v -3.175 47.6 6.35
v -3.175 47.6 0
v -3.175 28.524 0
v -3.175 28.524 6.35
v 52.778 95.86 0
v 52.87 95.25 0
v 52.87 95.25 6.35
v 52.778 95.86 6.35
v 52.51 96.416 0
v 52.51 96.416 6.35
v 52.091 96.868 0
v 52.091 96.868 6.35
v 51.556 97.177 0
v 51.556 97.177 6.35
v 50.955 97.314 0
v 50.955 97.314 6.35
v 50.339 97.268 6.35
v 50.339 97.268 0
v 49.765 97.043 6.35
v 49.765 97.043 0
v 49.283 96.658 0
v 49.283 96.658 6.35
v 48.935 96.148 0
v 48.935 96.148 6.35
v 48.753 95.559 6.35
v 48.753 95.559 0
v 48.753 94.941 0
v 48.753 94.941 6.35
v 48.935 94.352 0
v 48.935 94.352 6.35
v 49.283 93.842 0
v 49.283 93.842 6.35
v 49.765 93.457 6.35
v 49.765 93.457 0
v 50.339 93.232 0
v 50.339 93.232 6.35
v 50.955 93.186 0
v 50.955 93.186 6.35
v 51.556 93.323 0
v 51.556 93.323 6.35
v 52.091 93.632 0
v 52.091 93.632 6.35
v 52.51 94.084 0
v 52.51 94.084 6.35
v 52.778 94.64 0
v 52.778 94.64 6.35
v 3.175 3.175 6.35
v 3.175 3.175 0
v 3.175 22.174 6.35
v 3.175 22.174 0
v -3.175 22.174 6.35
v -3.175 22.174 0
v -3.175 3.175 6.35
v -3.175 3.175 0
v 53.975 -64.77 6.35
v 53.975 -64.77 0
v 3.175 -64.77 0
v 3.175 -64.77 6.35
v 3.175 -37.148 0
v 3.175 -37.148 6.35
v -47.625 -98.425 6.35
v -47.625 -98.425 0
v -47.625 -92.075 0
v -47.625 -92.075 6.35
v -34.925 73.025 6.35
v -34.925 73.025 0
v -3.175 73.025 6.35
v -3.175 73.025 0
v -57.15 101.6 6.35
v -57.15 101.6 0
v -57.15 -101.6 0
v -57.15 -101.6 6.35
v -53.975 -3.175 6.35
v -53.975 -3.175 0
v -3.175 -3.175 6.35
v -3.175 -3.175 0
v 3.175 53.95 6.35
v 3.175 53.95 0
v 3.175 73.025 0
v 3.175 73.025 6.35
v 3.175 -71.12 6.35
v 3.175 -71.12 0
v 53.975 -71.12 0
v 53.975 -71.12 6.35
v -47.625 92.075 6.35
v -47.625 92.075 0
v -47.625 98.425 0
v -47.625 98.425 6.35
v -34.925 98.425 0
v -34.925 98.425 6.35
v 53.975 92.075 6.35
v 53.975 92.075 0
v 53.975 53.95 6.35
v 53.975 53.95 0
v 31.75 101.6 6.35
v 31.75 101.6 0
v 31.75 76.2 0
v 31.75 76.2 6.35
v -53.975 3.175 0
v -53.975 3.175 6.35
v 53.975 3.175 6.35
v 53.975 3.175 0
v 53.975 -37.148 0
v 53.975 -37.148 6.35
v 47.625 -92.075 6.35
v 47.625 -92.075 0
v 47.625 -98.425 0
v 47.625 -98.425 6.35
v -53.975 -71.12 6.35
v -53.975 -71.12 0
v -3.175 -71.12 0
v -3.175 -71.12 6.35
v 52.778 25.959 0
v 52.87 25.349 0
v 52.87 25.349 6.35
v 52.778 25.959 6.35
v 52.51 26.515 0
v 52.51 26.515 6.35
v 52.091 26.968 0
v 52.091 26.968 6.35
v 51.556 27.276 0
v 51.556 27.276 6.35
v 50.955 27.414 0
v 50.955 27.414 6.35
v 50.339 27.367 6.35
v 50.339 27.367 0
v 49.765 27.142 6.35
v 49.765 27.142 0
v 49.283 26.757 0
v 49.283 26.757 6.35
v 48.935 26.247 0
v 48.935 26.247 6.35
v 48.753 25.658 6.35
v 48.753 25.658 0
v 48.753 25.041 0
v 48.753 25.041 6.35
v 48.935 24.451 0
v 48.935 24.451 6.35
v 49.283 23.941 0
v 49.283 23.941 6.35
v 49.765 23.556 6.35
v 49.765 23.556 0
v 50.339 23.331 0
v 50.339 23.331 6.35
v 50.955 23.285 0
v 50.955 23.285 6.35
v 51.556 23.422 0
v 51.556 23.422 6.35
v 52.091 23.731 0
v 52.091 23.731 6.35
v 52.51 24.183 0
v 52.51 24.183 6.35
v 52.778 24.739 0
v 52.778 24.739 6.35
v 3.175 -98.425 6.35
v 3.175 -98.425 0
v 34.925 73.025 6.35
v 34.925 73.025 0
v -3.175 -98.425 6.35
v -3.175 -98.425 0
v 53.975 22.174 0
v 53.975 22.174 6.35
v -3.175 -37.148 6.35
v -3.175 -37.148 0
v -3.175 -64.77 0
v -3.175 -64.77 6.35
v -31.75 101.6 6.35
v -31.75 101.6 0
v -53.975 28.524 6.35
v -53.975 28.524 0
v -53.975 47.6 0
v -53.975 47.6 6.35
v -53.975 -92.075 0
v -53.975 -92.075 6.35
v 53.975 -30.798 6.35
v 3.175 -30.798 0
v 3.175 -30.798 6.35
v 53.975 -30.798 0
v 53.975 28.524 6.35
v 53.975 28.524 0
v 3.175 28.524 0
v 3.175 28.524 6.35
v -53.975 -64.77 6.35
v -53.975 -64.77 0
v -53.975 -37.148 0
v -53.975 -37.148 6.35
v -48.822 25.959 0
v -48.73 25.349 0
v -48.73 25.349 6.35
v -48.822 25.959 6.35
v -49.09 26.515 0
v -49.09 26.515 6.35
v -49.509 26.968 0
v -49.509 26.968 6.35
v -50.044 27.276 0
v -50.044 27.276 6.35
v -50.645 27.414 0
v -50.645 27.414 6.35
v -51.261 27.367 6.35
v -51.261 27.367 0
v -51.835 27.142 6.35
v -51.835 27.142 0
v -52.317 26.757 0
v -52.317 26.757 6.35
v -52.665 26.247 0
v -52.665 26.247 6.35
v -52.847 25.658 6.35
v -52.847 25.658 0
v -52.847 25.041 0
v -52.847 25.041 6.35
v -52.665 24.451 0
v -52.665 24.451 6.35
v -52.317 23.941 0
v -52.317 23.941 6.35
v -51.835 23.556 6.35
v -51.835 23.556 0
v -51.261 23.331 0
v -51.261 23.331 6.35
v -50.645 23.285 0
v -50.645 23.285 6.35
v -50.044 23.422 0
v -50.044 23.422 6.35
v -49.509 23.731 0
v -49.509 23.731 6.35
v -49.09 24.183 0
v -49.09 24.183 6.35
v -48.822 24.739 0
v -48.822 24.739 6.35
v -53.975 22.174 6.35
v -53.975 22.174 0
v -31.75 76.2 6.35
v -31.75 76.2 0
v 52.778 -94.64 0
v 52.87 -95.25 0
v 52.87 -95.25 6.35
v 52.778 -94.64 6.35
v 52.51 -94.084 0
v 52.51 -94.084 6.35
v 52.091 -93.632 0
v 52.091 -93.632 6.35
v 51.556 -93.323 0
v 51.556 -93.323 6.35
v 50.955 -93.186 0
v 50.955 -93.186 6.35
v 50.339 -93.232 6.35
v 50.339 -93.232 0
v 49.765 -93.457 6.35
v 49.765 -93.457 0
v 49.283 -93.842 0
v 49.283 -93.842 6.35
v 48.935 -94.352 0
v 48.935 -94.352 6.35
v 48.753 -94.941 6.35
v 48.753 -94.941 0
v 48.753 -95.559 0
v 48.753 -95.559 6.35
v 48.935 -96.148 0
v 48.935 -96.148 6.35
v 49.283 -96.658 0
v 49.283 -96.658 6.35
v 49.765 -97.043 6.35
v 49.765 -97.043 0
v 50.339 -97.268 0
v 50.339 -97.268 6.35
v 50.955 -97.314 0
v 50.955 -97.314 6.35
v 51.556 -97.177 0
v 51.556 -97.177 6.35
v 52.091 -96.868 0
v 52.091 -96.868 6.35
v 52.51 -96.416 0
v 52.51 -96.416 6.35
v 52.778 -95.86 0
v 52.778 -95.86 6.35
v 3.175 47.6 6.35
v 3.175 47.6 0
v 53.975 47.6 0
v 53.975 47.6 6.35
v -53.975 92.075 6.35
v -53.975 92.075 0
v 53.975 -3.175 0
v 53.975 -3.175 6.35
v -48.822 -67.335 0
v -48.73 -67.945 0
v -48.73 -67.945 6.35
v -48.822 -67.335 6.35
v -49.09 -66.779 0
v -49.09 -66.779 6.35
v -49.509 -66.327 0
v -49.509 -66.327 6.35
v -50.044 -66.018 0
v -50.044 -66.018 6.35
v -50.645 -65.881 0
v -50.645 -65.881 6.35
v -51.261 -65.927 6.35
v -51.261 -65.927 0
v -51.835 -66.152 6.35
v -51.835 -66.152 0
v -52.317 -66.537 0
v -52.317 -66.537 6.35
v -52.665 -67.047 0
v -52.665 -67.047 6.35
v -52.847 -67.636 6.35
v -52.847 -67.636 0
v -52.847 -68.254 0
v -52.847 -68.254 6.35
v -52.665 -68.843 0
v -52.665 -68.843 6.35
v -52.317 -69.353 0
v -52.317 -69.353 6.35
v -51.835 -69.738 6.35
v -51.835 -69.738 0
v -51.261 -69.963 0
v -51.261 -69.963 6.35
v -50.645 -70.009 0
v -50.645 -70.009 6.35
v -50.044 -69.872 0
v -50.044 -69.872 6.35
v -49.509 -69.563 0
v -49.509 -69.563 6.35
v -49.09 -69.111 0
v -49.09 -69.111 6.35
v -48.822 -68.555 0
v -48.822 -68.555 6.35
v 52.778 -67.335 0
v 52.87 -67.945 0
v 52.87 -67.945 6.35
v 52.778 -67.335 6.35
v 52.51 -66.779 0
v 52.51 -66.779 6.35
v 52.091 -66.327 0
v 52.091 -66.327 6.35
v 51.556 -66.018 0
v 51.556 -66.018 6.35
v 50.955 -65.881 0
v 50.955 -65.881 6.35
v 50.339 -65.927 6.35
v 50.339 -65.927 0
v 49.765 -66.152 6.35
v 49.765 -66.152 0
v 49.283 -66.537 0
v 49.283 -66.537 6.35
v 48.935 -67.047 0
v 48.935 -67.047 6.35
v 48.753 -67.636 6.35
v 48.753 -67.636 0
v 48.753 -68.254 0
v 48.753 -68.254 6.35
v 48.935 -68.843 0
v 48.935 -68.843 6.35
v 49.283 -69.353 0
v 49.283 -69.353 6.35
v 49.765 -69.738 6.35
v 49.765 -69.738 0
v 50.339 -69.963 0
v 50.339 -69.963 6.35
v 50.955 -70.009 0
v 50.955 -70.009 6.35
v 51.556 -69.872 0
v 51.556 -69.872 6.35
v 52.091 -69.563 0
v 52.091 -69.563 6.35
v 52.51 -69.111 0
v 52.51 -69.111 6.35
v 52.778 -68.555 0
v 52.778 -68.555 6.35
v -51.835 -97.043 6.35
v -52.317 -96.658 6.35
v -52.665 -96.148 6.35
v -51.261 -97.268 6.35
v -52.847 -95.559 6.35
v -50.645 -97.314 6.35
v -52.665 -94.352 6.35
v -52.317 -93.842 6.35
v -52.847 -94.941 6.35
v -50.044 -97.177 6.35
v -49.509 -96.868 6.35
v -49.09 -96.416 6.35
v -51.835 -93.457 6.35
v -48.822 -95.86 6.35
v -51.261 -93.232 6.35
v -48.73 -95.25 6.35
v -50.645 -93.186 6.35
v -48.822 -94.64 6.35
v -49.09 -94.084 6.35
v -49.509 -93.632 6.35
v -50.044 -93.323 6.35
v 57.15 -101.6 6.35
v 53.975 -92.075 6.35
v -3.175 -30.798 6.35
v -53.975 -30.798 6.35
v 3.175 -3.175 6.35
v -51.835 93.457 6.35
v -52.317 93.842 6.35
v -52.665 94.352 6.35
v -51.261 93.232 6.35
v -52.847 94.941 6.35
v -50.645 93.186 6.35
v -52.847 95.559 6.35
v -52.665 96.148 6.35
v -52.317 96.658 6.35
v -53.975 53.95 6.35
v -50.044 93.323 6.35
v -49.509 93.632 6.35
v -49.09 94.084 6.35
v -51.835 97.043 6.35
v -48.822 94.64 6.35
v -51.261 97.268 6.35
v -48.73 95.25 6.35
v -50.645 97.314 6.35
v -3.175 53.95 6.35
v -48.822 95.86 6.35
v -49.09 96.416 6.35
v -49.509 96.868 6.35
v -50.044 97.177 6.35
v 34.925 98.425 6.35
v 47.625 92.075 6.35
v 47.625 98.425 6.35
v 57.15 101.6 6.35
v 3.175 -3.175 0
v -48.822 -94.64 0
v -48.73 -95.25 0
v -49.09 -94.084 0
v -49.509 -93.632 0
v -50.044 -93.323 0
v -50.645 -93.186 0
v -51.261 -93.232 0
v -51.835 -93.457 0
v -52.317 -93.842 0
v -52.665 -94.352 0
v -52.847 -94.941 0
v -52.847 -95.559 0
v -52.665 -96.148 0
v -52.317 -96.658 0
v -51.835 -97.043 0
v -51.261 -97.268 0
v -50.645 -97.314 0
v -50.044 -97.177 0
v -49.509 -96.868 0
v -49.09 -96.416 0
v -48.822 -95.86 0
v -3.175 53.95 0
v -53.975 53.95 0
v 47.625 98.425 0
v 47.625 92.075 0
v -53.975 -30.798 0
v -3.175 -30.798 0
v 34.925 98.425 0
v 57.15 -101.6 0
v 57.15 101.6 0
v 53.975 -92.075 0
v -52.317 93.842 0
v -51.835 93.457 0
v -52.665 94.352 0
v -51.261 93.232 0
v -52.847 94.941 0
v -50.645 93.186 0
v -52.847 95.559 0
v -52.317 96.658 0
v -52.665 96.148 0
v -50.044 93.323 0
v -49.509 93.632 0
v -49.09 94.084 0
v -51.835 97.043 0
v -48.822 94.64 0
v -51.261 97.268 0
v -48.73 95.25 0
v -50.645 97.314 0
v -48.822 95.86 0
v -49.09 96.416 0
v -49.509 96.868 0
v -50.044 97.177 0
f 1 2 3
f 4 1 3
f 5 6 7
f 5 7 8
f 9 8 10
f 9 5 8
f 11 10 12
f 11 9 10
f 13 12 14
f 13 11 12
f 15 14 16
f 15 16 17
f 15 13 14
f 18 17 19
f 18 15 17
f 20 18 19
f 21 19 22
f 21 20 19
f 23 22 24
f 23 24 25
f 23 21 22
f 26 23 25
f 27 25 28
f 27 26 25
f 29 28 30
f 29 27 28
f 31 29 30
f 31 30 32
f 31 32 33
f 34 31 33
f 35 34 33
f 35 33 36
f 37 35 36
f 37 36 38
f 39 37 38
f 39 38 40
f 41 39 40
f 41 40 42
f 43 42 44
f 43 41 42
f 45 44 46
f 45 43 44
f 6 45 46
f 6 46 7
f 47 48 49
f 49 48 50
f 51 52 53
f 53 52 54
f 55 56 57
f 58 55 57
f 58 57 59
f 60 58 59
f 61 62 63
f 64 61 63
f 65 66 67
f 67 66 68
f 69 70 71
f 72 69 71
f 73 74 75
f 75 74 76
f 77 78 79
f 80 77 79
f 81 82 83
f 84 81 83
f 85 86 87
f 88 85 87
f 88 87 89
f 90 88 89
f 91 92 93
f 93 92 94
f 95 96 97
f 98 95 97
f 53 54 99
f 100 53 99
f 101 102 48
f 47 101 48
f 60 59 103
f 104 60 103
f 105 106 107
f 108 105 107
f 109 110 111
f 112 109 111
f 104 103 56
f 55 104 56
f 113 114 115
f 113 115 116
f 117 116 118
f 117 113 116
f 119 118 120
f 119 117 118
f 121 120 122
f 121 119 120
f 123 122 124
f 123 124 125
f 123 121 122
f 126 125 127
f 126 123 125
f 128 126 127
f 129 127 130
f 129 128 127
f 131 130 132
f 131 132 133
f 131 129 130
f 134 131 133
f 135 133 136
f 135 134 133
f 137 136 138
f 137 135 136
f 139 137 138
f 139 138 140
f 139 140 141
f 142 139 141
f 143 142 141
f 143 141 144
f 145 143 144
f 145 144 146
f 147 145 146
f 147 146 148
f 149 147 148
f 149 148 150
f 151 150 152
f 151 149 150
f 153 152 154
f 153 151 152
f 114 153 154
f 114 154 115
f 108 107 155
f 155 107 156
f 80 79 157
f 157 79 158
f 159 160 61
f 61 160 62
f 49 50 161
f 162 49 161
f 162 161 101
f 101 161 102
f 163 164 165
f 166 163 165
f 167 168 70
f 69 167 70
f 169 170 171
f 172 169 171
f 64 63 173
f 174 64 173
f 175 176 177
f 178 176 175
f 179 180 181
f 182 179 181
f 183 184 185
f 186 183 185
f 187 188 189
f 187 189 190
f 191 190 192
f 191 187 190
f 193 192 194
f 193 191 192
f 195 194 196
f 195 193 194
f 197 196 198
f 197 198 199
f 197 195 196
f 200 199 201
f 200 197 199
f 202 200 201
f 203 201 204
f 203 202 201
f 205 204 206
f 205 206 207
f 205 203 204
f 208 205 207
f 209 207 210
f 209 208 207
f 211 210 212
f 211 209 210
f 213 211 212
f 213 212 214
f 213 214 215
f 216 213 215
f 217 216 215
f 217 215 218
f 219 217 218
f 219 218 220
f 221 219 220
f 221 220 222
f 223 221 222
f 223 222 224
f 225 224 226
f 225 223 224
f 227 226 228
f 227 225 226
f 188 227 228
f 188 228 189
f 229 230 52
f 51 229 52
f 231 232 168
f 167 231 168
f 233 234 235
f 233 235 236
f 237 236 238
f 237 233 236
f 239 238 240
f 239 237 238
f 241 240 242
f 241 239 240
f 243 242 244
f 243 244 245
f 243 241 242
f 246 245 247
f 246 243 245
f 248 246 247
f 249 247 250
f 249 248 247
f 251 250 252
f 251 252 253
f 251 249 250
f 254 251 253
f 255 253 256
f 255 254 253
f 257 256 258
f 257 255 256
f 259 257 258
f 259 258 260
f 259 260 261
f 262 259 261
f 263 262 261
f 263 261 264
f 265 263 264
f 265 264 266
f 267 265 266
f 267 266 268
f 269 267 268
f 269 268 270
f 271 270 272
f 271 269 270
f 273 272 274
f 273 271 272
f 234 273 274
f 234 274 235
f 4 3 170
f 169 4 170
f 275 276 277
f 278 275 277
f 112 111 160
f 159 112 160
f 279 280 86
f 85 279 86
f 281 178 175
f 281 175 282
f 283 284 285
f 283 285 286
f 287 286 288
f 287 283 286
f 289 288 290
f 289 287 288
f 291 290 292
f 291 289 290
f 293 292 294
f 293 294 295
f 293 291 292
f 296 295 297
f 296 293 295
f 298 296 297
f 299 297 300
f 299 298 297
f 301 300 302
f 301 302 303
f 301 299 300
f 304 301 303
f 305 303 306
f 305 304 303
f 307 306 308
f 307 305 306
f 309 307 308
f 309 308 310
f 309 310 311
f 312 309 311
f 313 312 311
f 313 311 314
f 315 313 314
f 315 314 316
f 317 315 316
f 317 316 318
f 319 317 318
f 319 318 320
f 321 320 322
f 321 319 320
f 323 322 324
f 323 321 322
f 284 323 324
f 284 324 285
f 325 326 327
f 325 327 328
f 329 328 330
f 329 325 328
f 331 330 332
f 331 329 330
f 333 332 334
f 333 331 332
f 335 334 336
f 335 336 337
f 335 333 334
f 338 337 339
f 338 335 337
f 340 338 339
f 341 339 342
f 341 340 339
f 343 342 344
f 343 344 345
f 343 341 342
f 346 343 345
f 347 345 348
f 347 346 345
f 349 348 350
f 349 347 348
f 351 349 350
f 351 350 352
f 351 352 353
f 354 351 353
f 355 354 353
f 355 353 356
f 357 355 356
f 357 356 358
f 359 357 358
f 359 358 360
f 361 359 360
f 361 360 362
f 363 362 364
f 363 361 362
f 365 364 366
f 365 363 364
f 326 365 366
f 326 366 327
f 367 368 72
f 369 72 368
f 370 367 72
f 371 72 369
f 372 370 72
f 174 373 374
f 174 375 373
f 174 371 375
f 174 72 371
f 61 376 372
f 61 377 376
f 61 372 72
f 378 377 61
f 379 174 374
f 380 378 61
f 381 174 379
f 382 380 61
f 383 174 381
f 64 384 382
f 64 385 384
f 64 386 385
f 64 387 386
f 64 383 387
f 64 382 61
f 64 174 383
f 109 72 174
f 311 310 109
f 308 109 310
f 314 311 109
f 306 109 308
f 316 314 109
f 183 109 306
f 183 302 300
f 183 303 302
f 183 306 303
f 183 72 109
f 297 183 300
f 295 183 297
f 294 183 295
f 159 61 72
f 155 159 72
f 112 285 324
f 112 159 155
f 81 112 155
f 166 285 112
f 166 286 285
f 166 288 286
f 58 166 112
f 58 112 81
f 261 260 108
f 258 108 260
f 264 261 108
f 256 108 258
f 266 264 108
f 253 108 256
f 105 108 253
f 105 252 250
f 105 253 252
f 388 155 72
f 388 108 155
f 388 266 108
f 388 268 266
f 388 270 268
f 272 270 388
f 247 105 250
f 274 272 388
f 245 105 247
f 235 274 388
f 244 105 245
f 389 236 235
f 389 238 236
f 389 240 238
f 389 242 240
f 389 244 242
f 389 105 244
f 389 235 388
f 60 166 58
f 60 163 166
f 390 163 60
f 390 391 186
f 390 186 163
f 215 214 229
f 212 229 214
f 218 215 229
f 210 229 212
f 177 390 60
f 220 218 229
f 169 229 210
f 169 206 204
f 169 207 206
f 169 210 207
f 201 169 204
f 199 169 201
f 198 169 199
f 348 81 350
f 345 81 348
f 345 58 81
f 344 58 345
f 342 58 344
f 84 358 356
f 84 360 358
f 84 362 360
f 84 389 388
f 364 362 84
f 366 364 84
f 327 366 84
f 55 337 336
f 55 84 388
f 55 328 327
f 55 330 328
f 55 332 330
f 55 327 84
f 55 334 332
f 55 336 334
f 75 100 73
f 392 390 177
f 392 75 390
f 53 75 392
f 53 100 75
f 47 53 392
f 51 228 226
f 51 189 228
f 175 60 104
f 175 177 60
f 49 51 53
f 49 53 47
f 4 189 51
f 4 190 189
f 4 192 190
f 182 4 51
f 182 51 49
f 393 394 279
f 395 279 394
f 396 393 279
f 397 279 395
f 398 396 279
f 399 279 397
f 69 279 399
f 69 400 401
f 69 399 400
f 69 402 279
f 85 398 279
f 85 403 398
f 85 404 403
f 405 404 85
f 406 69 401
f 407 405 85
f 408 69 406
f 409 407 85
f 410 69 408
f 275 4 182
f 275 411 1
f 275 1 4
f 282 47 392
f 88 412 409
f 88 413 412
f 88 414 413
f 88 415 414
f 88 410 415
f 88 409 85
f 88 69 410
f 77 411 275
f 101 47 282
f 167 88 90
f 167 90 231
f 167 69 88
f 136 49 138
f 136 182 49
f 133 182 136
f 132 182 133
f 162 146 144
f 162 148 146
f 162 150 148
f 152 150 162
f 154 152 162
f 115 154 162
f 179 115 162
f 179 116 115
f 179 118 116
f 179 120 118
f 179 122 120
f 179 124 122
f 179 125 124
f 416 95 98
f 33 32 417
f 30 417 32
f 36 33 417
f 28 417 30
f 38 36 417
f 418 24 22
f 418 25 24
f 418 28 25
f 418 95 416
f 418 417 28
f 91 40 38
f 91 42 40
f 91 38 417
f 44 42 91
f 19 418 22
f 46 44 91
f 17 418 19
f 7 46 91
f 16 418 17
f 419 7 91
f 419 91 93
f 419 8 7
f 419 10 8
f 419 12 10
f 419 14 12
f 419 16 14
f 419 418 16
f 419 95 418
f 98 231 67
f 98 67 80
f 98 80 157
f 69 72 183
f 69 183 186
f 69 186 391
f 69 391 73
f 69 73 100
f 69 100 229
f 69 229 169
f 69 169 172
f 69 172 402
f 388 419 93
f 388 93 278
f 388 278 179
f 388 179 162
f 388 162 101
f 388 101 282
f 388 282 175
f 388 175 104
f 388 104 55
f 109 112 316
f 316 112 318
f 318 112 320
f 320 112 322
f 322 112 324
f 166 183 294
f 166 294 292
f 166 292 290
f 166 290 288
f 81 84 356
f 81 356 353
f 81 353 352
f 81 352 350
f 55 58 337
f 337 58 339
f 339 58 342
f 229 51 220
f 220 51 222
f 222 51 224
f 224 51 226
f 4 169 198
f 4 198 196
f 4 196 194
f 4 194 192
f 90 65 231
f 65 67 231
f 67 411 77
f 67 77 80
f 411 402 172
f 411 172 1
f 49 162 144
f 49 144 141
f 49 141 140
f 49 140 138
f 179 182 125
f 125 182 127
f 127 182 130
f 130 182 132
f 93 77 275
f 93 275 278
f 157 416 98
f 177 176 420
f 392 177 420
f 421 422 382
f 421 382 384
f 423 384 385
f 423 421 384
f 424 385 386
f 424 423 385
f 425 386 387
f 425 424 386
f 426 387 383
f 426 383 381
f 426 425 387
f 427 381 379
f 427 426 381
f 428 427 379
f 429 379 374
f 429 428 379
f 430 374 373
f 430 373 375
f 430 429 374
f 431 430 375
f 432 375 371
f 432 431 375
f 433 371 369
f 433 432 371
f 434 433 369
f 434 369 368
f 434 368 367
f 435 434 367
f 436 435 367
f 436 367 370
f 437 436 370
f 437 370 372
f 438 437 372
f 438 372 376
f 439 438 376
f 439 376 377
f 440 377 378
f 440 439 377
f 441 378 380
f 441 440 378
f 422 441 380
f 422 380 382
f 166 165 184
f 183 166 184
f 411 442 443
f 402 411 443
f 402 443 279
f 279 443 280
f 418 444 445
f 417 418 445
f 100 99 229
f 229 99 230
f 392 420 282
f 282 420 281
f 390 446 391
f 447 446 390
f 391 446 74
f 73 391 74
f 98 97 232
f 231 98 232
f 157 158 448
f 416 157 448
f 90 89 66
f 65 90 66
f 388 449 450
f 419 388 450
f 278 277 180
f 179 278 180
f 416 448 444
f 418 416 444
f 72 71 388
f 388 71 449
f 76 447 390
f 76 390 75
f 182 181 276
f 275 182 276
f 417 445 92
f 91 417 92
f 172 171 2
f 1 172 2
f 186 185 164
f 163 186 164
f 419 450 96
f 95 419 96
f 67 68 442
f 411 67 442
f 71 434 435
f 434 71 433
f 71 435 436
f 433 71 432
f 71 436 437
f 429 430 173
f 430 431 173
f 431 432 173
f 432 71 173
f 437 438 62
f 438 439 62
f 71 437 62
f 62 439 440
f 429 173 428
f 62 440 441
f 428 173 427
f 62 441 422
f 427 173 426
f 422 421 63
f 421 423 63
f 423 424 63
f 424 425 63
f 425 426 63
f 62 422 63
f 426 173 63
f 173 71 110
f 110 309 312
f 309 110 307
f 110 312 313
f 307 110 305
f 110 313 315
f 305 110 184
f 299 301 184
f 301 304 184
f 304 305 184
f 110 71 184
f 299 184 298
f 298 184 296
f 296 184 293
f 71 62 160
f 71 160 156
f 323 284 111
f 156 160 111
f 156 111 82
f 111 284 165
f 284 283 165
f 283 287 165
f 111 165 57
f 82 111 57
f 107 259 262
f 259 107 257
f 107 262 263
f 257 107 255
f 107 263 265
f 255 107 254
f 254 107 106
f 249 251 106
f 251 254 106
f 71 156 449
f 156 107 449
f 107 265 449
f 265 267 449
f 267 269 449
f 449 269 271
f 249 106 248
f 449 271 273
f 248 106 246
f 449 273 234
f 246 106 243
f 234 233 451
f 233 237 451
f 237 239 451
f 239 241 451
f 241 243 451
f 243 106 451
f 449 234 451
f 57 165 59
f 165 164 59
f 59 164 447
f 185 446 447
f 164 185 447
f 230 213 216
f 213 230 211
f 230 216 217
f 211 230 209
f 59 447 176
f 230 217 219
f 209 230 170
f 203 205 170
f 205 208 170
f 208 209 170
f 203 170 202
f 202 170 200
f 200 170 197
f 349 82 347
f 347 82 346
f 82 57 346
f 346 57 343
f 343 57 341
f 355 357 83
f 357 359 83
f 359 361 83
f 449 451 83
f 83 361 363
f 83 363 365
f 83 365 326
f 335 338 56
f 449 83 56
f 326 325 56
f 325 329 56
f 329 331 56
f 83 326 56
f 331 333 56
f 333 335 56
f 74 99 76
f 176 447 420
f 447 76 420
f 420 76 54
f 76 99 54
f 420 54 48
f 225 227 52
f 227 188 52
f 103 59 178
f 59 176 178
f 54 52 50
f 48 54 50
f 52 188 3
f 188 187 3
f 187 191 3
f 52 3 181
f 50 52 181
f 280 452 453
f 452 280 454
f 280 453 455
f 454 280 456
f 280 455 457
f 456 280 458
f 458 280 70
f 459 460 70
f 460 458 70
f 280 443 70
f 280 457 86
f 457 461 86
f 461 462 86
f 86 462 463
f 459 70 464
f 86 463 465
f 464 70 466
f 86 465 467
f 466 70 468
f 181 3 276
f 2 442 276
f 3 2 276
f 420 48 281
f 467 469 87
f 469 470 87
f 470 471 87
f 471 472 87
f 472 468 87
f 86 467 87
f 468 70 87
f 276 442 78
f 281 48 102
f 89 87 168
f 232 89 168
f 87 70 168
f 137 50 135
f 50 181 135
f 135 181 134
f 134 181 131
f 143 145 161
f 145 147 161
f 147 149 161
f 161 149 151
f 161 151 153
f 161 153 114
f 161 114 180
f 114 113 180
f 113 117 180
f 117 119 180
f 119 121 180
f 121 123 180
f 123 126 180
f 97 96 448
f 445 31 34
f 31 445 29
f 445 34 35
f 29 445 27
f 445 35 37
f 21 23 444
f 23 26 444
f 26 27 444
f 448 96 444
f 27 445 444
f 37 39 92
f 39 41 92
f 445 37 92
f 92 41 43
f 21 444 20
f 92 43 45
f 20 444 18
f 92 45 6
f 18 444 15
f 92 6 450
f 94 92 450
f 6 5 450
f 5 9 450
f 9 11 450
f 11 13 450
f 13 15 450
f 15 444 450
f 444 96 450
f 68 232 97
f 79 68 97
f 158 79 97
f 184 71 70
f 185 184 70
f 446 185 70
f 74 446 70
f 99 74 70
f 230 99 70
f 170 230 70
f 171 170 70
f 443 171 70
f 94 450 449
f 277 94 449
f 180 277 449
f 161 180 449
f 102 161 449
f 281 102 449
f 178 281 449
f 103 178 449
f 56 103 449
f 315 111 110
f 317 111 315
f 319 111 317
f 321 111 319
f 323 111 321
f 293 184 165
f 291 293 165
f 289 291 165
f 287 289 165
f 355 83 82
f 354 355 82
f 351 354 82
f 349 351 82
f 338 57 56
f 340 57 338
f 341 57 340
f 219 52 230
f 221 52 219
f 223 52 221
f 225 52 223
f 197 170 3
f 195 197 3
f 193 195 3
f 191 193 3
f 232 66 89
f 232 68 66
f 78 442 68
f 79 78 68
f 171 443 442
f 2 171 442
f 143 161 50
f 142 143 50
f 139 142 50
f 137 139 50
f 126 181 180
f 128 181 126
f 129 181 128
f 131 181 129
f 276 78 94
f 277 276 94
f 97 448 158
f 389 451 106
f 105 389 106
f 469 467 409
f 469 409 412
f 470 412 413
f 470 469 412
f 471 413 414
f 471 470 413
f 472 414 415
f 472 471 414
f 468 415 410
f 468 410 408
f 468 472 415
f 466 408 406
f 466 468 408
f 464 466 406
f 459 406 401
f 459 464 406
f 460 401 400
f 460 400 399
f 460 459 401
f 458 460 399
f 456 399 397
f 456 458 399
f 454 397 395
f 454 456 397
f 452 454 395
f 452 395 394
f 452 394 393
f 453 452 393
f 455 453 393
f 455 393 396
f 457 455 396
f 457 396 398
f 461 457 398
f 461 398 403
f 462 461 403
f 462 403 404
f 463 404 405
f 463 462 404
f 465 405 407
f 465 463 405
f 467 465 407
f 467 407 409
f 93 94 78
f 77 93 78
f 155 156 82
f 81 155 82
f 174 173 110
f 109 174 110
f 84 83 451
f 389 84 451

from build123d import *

# Parameters (mm, degrees)
F0_R     = 2.0701
F0_W     = 50.8
F0_H     = 27.6225
F1_DEPTH = 6.35


with BuildPart() as f1:
    # F0 (on Top) → F1 (new body)
    with BuildSketch(Plane.XY):
        Polygon((31.75, 76.2), (0, 76.2), (-31.75, 76.2), (-31.75, 101.6), (-57.15, 101.6), (-57.15, -101.6), (0, -101.6), (57.15, -101.6), (57.15, 101.6), (31.75, 101.6), align=None)
        with Locations((-50.8, -95.25)):
            Circle(F0_R, mode=Mode.SUBTRACT)
        with Locations((-50.8, -67.945)):
            Circle(F0_R, mode=Mode.SUBTRACT)
        Polygon((-3.175, -98.425), (-47.625, -98.425), (-47.625, -92.075), (-53.975, -92.075), (-53.975, -71.12), (-47.625, -71.12), (-3.175, -71.12), align=None, mode=Mode.SUBTRACT)
        Polygon((-47.625, -64.77), (-53.975, -64.77), (-53.975, -37.1475), (-3.175, -37.1475), (-3.175, -64.77), align=None, mode=Mode.SUBTRACT)
        with Locations((-28.575, -16.98625)):
            Rectangle(F0_W, F0_H, mode=Mode.SUBTRACT)
        Polygon((47.625, -71.12), (53.975, -71.12), (53.975, -92.075), (47.625, -92.075), (47.625, -98.425), (3.175, -98.425), (3.175, -71.12), align=None, mode=Mode.SUBTRACT)
        with Locations((50.8, -95.25)):
            Circle(F0_R, mode=Mode.SUBTRACT)
        Polygon((53.975, -37.1475), (53.975, -64.77), (47.625, -64.77), (3.175, -64.77), (3.175, -37.1475), align=None, mode=Mode.SUBTRACT)
        with Locations((50.8, -67.945)):
            Circle(F0_R, mode=Mode.SUBTRACT)
        with Locations((28.575, -16.98625)):
            Rectangle(F0_W, F0_H, mode=Mode.SUBTRACT)
        with Locations((-50.8, 25.3492)):
            Circle(F0_R, mode=Mode.SUBTRACT)
        Polygon((-53.975, 3.175), (-53.975, 22.1742), (-47.625, 22.1742), (-3.175, 22.1742), (-3.175, 3.175), align=None, mode=Mode.SUBTRACT)
        Polygon((-53.975, 28.5242), (-53.975, 47.5996), (-3.175, 47.5996), (-3.175, 28.5242), (-47.625, 28.5242), align=None, mode=Mode.SUBTRACT)
        with Locations((-50.8, 95.25)):
            Circle(F0_R, mode=Mode.SUBTRACT)
        Polygon((-34.925, 73.025), (-3.175, 73.025), (-3.175, 53.9496), (-53.975, 53.9496), (-53.975, 92.075), (-47.625, 92.075), (-47.625, 98.425), (-34.925, 98.425), align=None, mode=Mode.SUBTRACT)
        Polygon((53.975, 3.175), (3.175, 3.175), (3.175, 22.1742), (47.625, 22.1742), (53.975, 22.1742), align=None, mode=Mode.SUBTRACT)
        with Locations((50.8, 25.3492)):
            Circle(F0_R, mode=Mode.SUBTRACT)
        Polygon((3.175, 47.5996), (53.975, 47.5996), (53.975, 28.5242), (47.625, 28.5242), (3.175, 28.5242), align=None, mode=Mode.SUBTRACT)
        Polygon((3.175, 53.9496), (3.175, 73.025), (34.925, 73.025), (34.925, 98.425), (47.625, 98.425), (47.625, 92.075), (53.975, 92.075), (53.975, 53.9496), align=None, mode=Mode.SUBTRACT)
        with Locations((50.8, 95.25)):
            Circle(F0_R, mode=Mode.SUBTRACT)
    extrude(amount=F1_DEPTH)


solid = f1.part
